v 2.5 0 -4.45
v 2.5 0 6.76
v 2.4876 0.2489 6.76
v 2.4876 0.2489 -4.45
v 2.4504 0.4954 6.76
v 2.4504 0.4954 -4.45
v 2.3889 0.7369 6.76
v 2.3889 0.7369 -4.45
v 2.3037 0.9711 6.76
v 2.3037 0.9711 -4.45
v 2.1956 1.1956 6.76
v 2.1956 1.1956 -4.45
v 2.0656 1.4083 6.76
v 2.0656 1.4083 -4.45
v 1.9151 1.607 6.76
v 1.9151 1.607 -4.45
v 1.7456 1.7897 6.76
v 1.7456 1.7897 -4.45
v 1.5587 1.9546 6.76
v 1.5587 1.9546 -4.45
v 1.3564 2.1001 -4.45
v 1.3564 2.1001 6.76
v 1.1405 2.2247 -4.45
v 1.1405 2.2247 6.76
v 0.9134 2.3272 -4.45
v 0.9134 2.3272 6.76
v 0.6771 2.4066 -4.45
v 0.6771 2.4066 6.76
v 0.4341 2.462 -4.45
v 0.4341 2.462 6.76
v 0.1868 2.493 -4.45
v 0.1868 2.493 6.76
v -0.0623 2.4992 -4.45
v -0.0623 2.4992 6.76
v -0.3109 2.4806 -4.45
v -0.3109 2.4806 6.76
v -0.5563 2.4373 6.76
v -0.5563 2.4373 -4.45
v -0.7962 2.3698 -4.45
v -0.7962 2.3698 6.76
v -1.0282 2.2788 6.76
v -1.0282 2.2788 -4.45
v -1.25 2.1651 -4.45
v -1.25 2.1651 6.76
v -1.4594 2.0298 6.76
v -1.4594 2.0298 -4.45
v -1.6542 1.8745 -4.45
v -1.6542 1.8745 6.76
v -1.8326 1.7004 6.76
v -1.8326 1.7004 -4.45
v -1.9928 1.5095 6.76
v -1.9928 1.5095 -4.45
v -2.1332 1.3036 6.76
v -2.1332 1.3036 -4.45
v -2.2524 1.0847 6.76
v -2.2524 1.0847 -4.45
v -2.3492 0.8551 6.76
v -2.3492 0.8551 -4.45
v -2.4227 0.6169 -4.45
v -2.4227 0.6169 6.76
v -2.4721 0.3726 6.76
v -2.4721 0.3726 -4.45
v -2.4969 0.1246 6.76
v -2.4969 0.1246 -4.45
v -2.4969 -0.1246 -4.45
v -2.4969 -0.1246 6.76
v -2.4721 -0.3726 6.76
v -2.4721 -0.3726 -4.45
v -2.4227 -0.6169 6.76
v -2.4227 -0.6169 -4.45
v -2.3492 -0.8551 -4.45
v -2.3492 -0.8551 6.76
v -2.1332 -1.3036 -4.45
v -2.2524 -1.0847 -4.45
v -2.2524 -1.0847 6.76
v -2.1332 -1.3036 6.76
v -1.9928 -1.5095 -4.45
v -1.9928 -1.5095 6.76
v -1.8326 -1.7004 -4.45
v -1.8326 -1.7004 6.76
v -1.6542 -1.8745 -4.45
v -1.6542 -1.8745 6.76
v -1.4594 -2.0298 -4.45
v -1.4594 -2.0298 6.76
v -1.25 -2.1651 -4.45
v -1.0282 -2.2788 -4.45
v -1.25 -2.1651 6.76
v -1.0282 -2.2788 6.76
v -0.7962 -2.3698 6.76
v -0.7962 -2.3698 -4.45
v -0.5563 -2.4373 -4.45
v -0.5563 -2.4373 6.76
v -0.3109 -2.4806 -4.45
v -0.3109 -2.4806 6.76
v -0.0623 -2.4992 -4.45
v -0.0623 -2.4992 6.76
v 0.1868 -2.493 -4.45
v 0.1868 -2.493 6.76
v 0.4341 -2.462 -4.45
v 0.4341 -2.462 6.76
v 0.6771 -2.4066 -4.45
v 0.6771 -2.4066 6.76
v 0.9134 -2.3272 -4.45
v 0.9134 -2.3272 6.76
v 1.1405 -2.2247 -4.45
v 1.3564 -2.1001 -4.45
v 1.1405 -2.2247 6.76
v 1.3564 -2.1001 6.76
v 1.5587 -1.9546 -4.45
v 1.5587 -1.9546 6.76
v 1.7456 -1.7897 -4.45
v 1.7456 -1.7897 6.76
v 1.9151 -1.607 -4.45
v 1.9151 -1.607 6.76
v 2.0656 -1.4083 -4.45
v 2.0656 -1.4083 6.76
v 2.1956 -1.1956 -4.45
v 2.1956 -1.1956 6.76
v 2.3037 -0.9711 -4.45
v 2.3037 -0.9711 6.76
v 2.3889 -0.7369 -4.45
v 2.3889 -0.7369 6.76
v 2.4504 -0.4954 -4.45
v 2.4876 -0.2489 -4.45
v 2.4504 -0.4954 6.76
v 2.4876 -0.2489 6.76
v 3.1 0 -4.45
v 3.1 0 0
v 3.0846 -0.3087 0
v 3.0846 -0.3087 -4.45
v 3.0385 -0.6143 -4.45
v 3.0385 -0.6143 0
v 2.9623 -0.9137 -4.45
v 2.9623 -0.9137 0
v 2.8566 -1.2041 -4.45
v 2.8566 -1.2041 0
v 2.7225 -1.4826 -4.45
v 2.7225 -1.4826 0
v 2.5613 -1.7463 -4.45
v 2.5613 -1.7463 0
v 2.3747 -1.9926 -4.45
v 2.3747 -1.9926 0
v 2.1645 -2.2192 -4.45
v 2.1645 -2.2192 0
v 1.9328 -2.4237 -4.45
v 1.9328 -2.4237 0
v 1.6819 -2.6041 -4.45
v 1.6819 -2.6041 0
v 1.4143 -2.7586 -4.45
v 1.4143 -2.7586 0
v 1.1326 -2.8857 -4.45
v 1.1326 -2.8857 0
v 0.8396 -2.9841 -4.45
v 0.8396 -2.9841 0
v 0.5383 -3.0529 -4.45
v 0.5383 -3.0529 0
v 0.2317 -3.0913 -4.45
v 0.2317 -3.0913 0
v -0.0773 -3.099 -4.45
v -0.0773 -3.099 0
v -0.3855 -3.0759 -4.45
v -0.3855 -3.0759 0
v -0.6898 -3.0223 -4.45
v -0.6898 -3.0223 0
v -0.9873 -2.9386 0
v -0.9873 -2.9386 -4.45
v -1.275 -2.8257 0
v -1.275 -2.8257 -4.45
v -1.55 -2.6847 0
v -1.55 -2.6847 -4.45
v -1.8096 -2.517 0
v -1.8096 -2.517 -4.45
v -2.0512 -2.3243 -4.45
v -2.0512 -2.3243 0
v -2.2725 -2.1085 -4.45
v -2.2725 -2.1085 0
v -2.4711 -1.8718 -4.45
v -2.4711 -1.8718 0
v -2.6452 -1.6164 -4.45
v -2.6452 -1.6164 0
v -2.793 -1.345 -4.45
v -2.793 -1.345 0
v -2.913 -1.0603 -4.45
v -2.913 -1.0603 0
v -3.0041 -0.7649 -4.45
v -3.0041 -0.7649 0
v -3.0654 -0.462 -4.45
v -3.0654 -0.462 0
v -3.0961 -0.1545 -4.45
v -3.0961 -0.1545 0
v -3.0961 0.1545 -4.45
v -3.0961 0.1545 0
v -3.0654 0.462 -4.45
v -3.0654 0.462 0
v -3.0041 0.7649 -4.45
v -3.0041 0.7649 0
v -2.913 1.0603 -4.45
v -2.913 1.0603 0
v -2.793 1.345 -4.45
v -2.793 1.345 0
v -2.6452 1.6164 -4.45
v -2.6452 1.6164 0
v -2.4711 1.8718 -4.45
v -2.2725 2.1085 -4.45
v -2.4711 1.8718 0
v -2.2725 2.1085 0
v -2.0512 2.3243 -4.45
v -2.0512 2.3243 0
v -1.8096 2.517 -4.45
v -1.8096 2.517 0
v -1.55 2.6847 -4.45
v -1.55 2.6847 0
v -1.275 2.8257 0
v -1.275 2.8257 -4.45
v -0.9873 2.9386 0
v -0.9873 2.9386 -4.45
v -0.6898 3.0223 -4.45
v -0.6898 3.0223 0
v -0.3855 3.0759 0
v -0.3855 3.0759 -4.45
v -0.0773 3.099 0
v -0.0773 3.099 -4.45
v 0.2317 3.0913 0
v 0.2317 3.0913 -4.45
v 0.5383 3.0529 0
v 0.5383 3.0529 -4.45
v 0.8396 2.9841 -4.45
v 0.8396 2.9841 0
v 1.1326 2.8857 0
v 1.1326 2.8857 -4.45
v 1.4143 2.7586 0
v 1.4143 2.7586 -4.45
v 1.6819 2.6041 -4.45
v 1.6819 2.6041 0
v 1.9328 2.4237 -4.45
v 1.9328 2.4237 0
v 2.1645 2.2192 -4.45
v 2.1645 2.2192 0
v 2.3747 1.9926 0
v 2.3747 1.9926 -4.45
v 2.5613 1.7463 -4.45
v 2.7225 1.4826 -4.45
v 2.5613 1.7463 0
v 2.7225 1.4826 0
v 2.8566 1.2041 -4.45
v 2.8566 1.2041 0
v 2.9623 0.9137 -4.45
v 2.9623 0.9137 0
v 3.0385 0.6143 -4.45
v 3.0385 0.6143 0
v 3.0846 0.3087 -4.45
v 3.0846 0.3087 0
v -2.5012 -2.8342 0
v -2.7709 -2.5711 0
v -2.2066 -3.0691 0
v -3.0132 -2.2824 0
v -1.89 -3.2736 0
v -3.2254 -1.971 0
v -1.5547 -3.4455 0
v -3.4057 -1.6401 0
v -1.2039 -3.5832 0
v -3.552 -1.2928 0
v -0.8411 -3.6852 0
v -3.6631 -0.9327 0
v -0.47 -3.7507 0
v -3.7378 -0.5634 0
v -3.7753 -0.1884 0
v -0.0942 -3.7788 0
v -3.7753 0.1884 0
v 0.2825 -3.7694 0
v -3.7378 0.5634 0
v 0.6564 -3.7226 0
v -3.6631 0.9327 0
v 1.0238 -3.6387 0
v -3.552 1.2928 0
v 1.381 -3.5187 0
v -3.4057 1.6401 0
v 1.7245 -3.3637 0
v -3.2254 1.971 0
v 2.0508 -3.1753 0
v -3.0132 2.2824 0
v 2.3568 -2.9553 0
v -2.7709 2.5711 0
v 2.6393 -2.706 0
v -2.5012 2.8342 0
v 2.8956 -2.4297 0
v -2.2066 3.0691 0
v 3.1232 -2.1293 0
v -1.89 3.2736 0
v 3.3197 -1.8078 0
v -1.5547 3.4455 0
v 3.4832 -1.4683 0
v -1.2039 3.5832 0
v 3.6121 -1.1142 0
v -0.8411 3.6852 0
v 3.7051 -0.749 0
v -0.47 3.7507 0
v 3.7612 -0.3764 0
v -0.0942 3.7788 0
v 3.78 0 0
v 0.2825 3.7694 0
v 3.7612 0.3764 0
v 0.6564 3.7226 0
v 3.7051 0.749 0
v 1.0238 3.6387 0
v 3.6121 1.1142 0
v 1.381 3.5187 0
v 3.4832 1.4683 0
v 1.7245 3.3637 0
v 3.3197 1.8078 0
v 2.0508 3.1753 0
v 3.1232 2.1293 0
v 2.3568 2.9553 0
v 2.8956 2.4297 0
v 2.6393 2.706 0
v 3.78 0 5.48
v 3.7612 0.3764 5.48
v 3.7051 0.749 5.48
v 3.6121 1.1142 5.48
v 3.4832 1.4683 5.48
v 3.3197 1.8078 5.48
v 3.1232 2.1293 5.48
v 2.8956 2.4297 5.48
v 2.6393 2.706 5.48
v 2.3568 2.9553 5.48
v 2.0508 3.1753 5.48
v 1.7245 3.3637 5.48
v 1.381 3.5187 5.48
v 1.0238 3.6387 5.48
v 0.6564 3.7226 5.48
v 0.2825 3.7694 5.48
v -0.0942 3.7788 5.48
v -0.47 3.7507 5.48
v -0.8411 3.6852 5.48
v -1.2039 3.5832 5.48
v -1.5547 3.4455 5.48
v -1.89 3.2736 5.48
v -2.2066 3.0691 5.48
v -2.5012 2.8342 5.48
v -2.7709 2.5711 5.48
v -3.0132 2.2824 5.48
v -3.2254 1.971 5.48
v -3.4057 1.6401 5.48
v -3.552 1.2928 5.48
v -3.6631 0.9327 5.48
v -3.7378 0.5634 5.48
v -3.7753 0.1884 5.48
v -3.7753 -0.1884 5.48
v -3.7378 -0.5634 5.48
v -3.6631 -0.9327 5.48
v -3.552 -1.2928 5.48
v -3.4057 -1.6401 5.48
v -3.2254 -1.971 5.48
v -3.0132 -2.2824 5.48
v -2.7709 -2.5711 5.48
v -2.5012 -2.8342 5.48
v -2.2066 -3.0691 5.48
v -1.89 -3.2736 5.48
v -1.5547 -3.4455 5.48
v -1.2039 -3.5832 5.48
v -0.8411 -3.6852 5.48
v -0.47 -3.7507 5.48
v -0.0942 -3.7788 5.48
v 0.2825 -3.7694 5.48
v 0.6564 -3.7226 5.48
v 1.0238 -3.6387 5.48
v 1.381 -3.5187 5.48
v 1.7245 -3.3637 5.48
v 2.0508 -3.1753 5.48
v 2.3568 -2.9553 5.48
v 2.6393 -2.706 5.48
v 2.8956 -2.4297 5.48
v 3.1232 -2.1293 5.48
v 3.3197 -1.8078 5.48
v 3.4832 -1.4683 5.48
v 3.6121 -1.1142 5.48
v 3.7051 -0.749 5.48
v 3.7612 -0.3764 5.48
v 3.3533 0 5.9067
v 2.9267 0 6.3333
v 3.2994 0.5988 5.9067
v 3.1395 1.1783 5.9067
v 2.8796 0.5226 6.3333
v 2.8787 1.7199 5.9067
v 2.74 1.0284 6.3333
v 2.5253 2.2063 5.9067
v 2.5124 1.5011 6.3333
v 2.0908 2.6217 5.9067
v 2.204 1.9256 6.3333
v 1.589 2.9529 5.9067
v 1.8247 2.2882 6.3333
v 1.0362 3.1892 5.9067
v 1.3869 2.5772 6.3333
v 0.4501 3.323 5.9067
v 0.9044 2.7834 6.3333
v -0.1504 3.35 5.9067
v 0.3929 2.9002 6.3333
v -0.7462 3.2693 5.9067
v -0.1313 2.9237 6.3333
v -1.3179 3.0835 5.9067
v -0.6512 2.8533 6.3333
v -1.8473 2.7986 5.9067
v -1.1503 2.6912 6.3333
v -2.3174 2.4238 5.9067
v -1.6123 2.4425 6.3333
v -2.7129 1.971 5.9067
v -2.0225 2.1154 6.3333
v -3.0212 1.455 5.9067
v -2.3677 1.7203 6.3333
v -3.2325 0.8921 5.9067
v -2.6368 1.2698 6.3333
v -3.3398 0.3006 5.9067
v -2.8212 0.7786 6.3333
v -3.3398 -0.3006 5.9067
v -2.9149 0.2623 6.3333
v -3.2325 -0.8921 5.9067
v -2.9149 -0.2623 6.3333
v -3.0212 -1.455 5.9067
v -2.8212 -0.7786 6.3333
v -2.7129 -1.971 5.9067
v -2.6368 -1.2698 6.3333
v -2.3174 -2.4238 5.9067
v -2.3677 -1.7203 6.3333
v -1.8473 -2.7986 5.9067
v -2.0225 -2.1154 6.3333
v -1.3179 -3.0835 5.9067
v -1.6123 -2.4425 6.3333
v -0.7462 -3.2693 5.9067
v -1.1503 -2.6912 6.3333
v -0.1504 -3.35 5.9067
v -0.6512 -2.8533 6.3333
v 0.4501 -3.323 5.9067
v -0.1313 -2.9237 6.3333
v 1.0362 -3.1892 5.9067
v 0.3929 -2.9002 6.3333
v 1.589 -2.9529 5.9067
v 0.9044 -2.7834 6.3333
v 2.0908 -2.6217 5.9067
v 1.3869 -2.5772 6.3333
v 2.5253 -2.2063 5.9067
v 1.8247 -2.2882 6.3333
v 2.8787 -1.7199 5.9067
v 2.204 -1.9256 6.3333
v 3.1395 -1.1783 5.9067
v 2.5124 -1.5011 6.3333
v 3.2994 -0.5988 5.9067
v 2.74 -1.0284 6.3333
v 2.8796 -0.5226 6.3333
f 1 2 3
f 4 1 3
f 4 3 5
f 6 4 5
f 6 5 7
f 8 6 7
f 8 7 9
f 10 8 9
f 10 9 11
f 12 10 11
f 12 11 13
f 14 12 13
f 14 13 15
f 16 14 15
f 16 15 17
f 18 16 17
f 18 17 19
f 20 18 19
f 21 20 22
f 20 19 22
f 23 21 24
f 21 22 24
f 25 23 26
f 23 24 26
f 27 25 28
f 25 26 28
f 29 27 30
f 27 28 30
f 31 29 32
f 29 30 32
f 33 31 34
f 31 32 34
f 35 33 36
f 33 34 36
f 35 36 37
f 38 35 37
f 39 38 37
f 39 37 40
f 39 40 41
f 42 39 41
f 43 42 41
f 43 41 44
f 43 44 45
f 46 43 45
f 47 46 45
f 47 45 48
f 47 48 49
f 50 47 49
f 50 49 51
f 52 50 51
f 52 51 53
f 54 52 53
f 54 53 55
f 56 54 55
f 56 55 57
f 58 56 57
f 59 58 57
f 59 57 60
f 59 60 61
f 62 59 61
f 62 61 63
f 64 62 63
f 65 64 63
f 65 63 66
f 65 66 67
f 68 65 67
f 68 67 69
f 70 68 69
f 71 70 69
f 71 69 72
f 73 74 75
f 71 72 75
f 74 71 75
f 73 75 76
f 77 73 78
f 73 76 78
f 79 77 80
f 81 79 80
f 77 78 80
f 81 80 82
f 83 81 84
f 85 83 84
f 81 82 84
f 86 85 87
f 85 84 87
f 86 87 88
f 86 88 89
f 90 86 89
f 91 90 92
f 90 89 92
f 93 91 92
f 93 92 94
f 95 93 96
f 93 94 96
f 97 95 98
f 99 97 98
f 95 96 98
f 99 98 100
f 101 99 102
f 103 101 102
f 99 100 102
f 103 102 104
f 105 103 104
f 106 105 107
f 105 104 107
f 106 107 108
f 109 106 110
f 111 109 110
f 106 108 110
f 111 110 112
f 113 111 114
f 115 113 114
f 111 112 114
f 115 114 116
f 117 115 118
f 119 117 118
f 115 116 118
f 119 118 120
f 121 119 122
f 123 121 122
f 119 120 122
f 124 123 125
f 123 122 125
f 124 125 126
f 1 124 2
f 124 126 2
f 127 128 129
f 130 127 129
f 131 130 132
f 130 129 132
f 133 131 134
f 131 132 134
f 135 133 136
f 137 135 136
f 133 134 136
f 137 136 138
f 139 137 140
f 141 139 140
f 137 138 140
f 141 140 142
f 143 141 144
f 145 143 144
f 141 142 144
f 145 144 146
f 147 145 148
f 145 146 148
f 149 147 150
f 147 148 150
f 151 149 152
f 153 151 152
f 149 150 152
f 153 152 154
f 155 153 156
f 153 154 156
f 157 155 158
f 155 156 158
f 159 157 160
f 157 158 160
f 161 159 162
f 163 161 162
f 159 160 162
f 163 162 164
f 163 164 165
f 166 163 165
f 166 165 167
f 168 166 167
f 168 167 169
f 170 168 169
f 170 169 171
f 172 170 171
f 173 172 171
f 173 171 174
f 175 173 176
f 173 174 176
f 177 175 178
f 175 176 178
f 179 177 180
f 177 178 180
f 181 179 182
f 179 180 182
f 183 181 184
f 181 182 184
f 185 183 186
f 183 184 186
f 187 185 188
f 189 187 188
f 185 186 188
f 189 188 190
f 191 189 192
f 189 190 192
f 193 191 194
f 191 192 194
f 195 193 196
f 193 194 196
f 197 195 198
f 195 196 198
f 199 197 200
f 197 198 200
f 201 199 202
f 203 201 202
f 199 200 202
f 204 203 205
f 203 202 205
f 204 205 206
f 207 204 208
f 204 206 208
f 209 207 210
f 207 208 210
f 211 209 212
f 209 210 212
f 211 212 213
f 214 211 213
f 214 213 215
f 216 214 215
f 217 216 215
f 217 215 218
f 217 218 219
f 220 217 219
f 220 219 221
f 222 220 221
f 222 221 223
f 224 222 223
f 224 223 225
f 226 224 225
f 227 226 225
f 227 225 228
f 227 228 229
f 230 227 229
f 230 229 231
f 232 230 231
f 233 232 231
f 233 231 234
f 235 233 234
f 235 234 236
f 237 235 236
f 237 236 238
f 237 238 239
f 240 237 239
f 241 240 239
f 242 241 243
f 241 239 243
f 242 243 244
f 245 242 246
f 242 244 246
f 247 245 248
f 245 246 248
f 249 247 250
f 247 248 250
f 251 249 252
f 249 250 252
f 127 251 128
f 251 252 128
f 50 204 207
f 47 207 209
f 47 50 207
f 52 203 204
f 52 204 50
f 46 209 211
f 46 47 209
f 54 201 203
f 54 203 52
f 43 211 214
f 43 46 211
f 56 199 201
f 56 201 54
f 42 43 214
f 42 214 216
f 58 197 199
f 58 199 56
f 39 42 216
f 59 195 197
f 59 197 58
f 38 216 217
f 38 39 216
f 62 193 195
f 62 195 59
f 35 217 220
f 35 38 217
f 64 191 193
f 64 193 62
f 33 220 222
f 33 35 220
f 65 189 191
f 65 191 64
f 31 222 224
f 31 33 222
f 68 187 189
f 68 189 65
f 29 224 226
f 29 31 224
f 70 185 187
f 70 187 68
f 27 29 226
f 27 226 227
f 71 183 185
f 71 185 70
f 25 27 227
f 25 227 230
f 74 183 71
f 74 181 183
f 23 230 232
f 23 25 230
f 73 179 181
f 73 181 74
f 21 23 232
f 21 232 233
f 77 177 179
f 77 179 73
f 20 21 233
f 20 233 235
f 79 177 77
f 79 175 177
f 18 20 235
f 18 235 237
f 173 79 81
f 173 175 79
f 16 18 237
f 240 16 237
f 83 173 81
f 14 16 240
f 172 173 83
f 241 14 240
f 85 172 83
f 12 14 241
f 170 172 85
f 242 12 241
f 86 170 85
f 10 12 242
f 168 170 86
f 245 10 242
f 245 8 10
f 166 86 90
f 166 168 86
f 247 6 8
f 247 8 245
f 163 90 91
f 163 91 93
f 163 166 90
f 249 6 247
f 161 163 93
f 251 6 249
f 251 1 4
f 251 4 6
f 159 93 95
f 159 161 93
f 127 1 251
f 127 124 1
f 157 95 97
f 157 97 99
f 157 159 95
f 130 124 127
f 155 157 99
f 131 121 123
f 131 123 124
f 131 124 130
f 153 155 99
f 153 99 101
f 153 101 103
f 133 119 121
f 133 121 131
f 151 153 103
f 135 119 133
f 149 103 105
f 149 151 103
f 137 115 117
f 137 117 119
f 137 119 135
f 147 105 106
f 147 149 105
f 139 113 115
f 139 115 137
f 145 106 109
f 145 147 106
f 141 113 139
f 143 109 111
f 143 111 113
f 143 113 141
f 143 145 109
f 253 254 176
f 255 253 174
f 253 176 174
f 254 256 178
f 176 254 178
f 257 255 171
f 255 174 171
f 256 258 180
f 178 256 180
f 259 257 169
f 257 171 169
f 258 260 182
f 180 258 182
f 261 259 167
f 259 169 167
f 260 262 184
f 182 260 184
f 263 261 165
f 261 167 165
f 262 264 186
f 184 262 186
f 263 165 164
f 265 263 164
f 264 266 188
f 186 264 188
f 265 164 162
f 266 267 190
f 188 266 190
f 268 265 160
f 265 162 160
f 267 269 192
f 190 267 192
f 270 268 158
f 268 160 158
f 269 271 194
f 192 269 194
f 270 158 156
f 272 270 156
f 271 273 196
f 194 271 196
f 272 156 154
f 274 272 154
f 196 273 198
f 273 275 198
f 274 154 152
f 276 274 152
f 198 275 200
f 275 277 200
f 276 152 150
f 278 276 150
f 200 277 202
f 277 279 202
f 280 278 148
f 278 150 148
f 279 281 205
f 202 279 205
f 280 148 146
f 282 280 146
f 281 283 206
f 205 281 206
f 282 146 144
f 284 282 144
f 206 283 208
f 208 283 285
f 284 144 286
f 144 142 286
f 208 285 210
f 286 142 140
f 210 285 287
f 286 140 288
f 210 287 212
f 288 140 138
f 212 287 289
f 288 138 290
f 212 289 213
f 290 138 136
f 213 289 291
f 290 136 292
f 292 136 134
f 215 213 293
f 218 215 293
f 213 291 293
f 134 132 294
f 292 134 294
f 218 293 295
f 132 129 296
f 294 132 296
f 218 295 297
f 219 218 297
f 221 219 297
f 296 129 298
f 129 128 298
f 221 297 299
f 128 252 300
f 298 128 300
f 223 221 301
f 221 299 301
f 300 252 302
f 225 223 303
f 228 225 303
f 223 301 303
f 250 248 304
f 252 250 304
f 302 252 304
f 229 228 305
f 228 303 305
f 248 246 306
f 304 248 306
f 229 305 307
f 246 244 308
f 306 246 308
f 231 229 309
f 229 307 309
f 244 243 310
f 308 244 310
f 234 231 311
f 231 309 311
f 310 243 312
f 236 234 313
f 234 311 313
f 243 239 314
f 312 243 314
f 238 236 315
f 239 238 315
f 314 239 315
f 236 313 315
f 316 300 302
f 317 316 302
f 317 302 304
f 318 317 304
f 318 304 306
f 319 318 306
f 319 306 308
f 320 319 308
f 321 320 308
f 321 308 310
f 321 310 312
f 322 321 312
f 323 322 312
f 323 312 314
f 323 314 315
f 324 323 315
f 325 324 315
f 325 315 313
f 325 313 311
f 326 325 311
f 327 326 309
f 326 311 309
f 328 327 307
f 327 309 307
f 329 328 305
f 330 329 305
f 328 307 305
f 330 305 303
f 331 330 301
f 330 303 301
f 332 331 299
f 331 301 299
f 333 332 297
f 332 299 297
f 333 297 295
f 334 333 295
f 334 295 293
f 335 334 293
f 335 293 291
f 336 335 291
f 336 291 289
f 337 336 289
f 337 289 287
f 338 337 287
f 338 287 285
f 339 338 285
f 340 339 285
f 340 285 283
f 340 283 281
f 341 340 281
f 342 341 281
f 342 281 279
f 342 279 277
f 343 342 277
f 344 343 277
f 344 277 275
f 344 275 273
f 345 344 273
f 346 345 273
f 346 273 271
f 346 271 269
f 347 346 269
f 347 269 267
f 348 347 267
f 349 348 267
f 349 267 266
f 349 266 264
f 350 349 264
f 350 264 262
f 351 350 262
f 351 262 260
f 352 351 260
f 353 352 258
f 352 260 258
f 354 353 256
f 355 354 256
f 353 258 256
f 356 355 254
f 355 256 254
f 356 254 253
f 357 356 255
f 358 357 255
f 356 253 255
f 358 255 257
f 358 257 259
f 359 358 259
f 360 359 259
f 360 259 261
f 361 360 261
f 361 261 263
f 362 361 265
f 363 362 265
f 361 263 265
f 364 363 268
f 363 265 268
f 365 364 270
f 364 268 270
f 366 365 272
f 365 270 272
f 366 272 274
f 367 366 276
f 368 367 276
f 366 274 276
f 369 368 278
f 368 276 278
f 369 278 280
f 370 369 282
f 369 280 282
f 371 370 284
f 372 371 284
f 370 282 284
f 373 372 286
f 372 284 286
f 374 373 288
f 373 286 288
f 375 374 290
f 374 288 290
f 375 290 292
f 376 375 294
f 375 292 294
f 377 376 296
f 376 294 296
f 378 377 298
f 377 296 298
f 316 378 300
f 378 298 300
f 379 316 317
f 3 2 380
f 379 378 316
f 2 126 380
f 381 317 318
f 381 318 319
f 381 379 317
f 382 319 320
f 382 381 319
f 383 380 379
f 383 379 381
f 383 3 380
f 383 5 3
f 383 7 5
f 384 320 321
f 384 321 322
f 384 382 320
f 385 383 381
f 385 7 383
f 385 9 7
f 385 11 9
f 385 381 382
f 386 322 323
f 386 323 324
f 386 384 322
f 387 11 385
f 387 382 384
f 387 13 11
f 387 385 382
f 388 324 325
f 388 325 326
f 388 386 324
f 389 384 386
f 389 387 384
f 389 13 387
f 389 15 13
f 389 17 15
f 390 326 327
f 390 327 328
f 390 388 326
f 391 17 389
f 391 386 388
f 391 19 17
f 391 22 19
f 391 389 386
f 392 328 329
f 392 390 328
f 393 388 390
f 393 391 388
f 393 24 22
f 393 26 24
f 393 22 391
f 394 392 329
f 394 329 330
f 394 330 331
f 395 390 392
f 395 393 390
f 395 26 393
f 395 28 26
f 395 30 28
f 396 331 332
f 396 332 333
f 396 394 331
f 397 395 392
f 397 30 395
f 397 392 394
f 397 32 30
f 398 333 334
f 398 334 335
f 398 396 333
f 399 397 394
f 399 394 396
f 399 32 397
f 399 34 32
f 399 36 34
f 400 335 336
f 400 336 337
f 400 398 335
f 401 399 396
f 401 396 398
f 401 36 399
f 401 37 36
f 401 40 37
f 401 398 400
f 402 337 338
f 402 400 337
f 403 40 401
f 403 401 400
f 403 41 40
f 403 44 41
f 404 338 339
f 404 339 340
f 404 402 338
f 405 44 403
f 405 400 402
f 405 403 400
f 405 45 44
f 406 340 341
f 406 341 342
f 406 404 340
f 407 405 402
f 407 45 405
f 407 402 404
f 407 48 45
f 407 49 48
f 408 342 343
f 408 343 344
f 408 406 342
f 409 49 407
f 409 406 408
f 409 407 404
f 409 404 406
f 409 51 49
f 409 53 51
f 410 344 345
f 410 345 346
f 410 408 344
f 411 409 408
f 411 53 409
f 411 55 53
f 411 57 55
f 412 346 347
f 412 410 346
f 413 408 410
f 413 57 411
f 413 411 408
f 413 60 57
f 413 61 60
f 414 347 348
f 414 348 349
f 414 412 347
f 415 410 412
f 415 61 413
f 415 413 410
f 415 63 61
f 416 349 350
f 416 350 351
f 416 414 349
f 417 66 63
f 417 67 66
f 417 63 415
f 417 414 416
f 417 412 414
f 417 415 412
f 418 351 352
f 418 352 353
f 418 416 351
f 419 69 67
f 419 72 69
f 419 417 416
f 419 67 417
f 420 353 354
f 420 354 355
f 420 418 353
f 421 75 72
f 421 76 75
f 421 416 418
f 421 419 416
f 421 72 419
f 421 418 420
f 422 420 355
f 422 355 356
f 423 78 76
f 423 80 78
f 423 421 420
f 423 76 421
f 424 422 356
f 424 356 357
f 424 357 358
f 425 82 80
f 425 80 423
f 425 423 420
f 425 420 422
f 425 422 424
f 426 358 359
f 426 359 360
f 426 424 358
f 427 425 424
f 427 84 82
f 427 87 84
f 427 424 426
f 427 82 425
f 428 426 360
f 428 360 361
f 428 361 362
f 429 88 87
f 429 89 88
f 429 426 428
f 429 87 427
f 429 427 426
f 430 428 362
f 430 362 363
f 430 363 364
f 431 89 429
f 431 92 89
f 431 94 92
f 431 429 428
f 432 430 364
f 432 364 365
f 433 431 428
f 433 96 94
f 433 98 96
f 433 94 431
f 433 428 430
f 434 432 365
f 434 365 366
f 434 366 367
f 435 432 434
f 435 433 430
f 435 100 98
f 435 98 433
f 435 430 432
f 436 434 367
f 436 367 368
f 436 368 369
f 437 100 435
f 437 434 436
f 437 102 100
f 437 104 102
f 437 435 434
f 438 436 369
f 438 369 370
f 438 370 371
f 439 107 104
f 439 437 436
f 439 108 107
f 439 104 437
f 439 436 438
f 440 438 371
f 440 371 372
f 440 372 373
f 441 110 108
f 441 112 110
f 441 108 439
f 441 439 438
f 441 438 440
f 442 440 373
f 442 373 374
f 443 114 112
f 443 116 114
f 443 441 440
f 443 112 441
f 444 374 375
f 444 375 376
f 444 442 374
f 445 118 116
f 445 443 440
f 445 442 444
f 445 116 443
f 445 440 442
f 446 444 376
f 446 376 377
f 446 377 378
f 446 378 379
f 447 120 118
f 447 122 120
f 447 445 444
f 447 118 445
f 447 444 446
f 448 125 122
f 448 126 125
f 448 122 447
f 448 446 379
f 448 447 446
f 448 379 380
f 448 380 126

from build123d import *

# Parameters (mm, degrees)
F0_R     = 3.78
F1_DEPTH = 6.88
F2_R     = 3.1
F3_DEPTH = 4.45
F4_R     = 2.5
F5_DEPTH = 11.6


# Not quite as in the source:
# - a fillet or chamfer that OpenCascade refuses, or shapes differently, is made with other operations: its cross-section is extruded or revolved along the edge and cut away or added


with BuildPart() as f1:
    # F0 (on Top) → F1 (new body)
    with BuildSketch(Plane.XY):
        Circle(F0_R)
    extrude(amount=F1_DEPTH)

    # F2 (on face) → F3 (join)
    with BuildSketch(Plane(origin=(0, 0, 0), x_dir=(1, 0, 0), z_dir=(0, 0, -1))):
        Circle(F2_R)
    extrude(amount=F3_DEPTH)

    # F4 (on face) → F5 (cut)
    with BuildSketch(Plane.XY.offset(6.88)):
        Circle(F4_R)
    extrude(amount=-F5_DEPTH, mode=Mode.SUBTRACT)

    # F6: chamfer of 1.4 on 1 edges, made by hand

    # F6_s1 → F6_t2 (revolve, cut)
    with BuildSketch(Plane.XZ):
        Polygon((3.78, 5.48), (2.38, 6.88), (3.78, 6.88), align=None)
    revolve(axis=Axis((0, 0, 6.88), (0, 0, 1)), mode=Mode.SUBTRACT)


solid = f1.part
